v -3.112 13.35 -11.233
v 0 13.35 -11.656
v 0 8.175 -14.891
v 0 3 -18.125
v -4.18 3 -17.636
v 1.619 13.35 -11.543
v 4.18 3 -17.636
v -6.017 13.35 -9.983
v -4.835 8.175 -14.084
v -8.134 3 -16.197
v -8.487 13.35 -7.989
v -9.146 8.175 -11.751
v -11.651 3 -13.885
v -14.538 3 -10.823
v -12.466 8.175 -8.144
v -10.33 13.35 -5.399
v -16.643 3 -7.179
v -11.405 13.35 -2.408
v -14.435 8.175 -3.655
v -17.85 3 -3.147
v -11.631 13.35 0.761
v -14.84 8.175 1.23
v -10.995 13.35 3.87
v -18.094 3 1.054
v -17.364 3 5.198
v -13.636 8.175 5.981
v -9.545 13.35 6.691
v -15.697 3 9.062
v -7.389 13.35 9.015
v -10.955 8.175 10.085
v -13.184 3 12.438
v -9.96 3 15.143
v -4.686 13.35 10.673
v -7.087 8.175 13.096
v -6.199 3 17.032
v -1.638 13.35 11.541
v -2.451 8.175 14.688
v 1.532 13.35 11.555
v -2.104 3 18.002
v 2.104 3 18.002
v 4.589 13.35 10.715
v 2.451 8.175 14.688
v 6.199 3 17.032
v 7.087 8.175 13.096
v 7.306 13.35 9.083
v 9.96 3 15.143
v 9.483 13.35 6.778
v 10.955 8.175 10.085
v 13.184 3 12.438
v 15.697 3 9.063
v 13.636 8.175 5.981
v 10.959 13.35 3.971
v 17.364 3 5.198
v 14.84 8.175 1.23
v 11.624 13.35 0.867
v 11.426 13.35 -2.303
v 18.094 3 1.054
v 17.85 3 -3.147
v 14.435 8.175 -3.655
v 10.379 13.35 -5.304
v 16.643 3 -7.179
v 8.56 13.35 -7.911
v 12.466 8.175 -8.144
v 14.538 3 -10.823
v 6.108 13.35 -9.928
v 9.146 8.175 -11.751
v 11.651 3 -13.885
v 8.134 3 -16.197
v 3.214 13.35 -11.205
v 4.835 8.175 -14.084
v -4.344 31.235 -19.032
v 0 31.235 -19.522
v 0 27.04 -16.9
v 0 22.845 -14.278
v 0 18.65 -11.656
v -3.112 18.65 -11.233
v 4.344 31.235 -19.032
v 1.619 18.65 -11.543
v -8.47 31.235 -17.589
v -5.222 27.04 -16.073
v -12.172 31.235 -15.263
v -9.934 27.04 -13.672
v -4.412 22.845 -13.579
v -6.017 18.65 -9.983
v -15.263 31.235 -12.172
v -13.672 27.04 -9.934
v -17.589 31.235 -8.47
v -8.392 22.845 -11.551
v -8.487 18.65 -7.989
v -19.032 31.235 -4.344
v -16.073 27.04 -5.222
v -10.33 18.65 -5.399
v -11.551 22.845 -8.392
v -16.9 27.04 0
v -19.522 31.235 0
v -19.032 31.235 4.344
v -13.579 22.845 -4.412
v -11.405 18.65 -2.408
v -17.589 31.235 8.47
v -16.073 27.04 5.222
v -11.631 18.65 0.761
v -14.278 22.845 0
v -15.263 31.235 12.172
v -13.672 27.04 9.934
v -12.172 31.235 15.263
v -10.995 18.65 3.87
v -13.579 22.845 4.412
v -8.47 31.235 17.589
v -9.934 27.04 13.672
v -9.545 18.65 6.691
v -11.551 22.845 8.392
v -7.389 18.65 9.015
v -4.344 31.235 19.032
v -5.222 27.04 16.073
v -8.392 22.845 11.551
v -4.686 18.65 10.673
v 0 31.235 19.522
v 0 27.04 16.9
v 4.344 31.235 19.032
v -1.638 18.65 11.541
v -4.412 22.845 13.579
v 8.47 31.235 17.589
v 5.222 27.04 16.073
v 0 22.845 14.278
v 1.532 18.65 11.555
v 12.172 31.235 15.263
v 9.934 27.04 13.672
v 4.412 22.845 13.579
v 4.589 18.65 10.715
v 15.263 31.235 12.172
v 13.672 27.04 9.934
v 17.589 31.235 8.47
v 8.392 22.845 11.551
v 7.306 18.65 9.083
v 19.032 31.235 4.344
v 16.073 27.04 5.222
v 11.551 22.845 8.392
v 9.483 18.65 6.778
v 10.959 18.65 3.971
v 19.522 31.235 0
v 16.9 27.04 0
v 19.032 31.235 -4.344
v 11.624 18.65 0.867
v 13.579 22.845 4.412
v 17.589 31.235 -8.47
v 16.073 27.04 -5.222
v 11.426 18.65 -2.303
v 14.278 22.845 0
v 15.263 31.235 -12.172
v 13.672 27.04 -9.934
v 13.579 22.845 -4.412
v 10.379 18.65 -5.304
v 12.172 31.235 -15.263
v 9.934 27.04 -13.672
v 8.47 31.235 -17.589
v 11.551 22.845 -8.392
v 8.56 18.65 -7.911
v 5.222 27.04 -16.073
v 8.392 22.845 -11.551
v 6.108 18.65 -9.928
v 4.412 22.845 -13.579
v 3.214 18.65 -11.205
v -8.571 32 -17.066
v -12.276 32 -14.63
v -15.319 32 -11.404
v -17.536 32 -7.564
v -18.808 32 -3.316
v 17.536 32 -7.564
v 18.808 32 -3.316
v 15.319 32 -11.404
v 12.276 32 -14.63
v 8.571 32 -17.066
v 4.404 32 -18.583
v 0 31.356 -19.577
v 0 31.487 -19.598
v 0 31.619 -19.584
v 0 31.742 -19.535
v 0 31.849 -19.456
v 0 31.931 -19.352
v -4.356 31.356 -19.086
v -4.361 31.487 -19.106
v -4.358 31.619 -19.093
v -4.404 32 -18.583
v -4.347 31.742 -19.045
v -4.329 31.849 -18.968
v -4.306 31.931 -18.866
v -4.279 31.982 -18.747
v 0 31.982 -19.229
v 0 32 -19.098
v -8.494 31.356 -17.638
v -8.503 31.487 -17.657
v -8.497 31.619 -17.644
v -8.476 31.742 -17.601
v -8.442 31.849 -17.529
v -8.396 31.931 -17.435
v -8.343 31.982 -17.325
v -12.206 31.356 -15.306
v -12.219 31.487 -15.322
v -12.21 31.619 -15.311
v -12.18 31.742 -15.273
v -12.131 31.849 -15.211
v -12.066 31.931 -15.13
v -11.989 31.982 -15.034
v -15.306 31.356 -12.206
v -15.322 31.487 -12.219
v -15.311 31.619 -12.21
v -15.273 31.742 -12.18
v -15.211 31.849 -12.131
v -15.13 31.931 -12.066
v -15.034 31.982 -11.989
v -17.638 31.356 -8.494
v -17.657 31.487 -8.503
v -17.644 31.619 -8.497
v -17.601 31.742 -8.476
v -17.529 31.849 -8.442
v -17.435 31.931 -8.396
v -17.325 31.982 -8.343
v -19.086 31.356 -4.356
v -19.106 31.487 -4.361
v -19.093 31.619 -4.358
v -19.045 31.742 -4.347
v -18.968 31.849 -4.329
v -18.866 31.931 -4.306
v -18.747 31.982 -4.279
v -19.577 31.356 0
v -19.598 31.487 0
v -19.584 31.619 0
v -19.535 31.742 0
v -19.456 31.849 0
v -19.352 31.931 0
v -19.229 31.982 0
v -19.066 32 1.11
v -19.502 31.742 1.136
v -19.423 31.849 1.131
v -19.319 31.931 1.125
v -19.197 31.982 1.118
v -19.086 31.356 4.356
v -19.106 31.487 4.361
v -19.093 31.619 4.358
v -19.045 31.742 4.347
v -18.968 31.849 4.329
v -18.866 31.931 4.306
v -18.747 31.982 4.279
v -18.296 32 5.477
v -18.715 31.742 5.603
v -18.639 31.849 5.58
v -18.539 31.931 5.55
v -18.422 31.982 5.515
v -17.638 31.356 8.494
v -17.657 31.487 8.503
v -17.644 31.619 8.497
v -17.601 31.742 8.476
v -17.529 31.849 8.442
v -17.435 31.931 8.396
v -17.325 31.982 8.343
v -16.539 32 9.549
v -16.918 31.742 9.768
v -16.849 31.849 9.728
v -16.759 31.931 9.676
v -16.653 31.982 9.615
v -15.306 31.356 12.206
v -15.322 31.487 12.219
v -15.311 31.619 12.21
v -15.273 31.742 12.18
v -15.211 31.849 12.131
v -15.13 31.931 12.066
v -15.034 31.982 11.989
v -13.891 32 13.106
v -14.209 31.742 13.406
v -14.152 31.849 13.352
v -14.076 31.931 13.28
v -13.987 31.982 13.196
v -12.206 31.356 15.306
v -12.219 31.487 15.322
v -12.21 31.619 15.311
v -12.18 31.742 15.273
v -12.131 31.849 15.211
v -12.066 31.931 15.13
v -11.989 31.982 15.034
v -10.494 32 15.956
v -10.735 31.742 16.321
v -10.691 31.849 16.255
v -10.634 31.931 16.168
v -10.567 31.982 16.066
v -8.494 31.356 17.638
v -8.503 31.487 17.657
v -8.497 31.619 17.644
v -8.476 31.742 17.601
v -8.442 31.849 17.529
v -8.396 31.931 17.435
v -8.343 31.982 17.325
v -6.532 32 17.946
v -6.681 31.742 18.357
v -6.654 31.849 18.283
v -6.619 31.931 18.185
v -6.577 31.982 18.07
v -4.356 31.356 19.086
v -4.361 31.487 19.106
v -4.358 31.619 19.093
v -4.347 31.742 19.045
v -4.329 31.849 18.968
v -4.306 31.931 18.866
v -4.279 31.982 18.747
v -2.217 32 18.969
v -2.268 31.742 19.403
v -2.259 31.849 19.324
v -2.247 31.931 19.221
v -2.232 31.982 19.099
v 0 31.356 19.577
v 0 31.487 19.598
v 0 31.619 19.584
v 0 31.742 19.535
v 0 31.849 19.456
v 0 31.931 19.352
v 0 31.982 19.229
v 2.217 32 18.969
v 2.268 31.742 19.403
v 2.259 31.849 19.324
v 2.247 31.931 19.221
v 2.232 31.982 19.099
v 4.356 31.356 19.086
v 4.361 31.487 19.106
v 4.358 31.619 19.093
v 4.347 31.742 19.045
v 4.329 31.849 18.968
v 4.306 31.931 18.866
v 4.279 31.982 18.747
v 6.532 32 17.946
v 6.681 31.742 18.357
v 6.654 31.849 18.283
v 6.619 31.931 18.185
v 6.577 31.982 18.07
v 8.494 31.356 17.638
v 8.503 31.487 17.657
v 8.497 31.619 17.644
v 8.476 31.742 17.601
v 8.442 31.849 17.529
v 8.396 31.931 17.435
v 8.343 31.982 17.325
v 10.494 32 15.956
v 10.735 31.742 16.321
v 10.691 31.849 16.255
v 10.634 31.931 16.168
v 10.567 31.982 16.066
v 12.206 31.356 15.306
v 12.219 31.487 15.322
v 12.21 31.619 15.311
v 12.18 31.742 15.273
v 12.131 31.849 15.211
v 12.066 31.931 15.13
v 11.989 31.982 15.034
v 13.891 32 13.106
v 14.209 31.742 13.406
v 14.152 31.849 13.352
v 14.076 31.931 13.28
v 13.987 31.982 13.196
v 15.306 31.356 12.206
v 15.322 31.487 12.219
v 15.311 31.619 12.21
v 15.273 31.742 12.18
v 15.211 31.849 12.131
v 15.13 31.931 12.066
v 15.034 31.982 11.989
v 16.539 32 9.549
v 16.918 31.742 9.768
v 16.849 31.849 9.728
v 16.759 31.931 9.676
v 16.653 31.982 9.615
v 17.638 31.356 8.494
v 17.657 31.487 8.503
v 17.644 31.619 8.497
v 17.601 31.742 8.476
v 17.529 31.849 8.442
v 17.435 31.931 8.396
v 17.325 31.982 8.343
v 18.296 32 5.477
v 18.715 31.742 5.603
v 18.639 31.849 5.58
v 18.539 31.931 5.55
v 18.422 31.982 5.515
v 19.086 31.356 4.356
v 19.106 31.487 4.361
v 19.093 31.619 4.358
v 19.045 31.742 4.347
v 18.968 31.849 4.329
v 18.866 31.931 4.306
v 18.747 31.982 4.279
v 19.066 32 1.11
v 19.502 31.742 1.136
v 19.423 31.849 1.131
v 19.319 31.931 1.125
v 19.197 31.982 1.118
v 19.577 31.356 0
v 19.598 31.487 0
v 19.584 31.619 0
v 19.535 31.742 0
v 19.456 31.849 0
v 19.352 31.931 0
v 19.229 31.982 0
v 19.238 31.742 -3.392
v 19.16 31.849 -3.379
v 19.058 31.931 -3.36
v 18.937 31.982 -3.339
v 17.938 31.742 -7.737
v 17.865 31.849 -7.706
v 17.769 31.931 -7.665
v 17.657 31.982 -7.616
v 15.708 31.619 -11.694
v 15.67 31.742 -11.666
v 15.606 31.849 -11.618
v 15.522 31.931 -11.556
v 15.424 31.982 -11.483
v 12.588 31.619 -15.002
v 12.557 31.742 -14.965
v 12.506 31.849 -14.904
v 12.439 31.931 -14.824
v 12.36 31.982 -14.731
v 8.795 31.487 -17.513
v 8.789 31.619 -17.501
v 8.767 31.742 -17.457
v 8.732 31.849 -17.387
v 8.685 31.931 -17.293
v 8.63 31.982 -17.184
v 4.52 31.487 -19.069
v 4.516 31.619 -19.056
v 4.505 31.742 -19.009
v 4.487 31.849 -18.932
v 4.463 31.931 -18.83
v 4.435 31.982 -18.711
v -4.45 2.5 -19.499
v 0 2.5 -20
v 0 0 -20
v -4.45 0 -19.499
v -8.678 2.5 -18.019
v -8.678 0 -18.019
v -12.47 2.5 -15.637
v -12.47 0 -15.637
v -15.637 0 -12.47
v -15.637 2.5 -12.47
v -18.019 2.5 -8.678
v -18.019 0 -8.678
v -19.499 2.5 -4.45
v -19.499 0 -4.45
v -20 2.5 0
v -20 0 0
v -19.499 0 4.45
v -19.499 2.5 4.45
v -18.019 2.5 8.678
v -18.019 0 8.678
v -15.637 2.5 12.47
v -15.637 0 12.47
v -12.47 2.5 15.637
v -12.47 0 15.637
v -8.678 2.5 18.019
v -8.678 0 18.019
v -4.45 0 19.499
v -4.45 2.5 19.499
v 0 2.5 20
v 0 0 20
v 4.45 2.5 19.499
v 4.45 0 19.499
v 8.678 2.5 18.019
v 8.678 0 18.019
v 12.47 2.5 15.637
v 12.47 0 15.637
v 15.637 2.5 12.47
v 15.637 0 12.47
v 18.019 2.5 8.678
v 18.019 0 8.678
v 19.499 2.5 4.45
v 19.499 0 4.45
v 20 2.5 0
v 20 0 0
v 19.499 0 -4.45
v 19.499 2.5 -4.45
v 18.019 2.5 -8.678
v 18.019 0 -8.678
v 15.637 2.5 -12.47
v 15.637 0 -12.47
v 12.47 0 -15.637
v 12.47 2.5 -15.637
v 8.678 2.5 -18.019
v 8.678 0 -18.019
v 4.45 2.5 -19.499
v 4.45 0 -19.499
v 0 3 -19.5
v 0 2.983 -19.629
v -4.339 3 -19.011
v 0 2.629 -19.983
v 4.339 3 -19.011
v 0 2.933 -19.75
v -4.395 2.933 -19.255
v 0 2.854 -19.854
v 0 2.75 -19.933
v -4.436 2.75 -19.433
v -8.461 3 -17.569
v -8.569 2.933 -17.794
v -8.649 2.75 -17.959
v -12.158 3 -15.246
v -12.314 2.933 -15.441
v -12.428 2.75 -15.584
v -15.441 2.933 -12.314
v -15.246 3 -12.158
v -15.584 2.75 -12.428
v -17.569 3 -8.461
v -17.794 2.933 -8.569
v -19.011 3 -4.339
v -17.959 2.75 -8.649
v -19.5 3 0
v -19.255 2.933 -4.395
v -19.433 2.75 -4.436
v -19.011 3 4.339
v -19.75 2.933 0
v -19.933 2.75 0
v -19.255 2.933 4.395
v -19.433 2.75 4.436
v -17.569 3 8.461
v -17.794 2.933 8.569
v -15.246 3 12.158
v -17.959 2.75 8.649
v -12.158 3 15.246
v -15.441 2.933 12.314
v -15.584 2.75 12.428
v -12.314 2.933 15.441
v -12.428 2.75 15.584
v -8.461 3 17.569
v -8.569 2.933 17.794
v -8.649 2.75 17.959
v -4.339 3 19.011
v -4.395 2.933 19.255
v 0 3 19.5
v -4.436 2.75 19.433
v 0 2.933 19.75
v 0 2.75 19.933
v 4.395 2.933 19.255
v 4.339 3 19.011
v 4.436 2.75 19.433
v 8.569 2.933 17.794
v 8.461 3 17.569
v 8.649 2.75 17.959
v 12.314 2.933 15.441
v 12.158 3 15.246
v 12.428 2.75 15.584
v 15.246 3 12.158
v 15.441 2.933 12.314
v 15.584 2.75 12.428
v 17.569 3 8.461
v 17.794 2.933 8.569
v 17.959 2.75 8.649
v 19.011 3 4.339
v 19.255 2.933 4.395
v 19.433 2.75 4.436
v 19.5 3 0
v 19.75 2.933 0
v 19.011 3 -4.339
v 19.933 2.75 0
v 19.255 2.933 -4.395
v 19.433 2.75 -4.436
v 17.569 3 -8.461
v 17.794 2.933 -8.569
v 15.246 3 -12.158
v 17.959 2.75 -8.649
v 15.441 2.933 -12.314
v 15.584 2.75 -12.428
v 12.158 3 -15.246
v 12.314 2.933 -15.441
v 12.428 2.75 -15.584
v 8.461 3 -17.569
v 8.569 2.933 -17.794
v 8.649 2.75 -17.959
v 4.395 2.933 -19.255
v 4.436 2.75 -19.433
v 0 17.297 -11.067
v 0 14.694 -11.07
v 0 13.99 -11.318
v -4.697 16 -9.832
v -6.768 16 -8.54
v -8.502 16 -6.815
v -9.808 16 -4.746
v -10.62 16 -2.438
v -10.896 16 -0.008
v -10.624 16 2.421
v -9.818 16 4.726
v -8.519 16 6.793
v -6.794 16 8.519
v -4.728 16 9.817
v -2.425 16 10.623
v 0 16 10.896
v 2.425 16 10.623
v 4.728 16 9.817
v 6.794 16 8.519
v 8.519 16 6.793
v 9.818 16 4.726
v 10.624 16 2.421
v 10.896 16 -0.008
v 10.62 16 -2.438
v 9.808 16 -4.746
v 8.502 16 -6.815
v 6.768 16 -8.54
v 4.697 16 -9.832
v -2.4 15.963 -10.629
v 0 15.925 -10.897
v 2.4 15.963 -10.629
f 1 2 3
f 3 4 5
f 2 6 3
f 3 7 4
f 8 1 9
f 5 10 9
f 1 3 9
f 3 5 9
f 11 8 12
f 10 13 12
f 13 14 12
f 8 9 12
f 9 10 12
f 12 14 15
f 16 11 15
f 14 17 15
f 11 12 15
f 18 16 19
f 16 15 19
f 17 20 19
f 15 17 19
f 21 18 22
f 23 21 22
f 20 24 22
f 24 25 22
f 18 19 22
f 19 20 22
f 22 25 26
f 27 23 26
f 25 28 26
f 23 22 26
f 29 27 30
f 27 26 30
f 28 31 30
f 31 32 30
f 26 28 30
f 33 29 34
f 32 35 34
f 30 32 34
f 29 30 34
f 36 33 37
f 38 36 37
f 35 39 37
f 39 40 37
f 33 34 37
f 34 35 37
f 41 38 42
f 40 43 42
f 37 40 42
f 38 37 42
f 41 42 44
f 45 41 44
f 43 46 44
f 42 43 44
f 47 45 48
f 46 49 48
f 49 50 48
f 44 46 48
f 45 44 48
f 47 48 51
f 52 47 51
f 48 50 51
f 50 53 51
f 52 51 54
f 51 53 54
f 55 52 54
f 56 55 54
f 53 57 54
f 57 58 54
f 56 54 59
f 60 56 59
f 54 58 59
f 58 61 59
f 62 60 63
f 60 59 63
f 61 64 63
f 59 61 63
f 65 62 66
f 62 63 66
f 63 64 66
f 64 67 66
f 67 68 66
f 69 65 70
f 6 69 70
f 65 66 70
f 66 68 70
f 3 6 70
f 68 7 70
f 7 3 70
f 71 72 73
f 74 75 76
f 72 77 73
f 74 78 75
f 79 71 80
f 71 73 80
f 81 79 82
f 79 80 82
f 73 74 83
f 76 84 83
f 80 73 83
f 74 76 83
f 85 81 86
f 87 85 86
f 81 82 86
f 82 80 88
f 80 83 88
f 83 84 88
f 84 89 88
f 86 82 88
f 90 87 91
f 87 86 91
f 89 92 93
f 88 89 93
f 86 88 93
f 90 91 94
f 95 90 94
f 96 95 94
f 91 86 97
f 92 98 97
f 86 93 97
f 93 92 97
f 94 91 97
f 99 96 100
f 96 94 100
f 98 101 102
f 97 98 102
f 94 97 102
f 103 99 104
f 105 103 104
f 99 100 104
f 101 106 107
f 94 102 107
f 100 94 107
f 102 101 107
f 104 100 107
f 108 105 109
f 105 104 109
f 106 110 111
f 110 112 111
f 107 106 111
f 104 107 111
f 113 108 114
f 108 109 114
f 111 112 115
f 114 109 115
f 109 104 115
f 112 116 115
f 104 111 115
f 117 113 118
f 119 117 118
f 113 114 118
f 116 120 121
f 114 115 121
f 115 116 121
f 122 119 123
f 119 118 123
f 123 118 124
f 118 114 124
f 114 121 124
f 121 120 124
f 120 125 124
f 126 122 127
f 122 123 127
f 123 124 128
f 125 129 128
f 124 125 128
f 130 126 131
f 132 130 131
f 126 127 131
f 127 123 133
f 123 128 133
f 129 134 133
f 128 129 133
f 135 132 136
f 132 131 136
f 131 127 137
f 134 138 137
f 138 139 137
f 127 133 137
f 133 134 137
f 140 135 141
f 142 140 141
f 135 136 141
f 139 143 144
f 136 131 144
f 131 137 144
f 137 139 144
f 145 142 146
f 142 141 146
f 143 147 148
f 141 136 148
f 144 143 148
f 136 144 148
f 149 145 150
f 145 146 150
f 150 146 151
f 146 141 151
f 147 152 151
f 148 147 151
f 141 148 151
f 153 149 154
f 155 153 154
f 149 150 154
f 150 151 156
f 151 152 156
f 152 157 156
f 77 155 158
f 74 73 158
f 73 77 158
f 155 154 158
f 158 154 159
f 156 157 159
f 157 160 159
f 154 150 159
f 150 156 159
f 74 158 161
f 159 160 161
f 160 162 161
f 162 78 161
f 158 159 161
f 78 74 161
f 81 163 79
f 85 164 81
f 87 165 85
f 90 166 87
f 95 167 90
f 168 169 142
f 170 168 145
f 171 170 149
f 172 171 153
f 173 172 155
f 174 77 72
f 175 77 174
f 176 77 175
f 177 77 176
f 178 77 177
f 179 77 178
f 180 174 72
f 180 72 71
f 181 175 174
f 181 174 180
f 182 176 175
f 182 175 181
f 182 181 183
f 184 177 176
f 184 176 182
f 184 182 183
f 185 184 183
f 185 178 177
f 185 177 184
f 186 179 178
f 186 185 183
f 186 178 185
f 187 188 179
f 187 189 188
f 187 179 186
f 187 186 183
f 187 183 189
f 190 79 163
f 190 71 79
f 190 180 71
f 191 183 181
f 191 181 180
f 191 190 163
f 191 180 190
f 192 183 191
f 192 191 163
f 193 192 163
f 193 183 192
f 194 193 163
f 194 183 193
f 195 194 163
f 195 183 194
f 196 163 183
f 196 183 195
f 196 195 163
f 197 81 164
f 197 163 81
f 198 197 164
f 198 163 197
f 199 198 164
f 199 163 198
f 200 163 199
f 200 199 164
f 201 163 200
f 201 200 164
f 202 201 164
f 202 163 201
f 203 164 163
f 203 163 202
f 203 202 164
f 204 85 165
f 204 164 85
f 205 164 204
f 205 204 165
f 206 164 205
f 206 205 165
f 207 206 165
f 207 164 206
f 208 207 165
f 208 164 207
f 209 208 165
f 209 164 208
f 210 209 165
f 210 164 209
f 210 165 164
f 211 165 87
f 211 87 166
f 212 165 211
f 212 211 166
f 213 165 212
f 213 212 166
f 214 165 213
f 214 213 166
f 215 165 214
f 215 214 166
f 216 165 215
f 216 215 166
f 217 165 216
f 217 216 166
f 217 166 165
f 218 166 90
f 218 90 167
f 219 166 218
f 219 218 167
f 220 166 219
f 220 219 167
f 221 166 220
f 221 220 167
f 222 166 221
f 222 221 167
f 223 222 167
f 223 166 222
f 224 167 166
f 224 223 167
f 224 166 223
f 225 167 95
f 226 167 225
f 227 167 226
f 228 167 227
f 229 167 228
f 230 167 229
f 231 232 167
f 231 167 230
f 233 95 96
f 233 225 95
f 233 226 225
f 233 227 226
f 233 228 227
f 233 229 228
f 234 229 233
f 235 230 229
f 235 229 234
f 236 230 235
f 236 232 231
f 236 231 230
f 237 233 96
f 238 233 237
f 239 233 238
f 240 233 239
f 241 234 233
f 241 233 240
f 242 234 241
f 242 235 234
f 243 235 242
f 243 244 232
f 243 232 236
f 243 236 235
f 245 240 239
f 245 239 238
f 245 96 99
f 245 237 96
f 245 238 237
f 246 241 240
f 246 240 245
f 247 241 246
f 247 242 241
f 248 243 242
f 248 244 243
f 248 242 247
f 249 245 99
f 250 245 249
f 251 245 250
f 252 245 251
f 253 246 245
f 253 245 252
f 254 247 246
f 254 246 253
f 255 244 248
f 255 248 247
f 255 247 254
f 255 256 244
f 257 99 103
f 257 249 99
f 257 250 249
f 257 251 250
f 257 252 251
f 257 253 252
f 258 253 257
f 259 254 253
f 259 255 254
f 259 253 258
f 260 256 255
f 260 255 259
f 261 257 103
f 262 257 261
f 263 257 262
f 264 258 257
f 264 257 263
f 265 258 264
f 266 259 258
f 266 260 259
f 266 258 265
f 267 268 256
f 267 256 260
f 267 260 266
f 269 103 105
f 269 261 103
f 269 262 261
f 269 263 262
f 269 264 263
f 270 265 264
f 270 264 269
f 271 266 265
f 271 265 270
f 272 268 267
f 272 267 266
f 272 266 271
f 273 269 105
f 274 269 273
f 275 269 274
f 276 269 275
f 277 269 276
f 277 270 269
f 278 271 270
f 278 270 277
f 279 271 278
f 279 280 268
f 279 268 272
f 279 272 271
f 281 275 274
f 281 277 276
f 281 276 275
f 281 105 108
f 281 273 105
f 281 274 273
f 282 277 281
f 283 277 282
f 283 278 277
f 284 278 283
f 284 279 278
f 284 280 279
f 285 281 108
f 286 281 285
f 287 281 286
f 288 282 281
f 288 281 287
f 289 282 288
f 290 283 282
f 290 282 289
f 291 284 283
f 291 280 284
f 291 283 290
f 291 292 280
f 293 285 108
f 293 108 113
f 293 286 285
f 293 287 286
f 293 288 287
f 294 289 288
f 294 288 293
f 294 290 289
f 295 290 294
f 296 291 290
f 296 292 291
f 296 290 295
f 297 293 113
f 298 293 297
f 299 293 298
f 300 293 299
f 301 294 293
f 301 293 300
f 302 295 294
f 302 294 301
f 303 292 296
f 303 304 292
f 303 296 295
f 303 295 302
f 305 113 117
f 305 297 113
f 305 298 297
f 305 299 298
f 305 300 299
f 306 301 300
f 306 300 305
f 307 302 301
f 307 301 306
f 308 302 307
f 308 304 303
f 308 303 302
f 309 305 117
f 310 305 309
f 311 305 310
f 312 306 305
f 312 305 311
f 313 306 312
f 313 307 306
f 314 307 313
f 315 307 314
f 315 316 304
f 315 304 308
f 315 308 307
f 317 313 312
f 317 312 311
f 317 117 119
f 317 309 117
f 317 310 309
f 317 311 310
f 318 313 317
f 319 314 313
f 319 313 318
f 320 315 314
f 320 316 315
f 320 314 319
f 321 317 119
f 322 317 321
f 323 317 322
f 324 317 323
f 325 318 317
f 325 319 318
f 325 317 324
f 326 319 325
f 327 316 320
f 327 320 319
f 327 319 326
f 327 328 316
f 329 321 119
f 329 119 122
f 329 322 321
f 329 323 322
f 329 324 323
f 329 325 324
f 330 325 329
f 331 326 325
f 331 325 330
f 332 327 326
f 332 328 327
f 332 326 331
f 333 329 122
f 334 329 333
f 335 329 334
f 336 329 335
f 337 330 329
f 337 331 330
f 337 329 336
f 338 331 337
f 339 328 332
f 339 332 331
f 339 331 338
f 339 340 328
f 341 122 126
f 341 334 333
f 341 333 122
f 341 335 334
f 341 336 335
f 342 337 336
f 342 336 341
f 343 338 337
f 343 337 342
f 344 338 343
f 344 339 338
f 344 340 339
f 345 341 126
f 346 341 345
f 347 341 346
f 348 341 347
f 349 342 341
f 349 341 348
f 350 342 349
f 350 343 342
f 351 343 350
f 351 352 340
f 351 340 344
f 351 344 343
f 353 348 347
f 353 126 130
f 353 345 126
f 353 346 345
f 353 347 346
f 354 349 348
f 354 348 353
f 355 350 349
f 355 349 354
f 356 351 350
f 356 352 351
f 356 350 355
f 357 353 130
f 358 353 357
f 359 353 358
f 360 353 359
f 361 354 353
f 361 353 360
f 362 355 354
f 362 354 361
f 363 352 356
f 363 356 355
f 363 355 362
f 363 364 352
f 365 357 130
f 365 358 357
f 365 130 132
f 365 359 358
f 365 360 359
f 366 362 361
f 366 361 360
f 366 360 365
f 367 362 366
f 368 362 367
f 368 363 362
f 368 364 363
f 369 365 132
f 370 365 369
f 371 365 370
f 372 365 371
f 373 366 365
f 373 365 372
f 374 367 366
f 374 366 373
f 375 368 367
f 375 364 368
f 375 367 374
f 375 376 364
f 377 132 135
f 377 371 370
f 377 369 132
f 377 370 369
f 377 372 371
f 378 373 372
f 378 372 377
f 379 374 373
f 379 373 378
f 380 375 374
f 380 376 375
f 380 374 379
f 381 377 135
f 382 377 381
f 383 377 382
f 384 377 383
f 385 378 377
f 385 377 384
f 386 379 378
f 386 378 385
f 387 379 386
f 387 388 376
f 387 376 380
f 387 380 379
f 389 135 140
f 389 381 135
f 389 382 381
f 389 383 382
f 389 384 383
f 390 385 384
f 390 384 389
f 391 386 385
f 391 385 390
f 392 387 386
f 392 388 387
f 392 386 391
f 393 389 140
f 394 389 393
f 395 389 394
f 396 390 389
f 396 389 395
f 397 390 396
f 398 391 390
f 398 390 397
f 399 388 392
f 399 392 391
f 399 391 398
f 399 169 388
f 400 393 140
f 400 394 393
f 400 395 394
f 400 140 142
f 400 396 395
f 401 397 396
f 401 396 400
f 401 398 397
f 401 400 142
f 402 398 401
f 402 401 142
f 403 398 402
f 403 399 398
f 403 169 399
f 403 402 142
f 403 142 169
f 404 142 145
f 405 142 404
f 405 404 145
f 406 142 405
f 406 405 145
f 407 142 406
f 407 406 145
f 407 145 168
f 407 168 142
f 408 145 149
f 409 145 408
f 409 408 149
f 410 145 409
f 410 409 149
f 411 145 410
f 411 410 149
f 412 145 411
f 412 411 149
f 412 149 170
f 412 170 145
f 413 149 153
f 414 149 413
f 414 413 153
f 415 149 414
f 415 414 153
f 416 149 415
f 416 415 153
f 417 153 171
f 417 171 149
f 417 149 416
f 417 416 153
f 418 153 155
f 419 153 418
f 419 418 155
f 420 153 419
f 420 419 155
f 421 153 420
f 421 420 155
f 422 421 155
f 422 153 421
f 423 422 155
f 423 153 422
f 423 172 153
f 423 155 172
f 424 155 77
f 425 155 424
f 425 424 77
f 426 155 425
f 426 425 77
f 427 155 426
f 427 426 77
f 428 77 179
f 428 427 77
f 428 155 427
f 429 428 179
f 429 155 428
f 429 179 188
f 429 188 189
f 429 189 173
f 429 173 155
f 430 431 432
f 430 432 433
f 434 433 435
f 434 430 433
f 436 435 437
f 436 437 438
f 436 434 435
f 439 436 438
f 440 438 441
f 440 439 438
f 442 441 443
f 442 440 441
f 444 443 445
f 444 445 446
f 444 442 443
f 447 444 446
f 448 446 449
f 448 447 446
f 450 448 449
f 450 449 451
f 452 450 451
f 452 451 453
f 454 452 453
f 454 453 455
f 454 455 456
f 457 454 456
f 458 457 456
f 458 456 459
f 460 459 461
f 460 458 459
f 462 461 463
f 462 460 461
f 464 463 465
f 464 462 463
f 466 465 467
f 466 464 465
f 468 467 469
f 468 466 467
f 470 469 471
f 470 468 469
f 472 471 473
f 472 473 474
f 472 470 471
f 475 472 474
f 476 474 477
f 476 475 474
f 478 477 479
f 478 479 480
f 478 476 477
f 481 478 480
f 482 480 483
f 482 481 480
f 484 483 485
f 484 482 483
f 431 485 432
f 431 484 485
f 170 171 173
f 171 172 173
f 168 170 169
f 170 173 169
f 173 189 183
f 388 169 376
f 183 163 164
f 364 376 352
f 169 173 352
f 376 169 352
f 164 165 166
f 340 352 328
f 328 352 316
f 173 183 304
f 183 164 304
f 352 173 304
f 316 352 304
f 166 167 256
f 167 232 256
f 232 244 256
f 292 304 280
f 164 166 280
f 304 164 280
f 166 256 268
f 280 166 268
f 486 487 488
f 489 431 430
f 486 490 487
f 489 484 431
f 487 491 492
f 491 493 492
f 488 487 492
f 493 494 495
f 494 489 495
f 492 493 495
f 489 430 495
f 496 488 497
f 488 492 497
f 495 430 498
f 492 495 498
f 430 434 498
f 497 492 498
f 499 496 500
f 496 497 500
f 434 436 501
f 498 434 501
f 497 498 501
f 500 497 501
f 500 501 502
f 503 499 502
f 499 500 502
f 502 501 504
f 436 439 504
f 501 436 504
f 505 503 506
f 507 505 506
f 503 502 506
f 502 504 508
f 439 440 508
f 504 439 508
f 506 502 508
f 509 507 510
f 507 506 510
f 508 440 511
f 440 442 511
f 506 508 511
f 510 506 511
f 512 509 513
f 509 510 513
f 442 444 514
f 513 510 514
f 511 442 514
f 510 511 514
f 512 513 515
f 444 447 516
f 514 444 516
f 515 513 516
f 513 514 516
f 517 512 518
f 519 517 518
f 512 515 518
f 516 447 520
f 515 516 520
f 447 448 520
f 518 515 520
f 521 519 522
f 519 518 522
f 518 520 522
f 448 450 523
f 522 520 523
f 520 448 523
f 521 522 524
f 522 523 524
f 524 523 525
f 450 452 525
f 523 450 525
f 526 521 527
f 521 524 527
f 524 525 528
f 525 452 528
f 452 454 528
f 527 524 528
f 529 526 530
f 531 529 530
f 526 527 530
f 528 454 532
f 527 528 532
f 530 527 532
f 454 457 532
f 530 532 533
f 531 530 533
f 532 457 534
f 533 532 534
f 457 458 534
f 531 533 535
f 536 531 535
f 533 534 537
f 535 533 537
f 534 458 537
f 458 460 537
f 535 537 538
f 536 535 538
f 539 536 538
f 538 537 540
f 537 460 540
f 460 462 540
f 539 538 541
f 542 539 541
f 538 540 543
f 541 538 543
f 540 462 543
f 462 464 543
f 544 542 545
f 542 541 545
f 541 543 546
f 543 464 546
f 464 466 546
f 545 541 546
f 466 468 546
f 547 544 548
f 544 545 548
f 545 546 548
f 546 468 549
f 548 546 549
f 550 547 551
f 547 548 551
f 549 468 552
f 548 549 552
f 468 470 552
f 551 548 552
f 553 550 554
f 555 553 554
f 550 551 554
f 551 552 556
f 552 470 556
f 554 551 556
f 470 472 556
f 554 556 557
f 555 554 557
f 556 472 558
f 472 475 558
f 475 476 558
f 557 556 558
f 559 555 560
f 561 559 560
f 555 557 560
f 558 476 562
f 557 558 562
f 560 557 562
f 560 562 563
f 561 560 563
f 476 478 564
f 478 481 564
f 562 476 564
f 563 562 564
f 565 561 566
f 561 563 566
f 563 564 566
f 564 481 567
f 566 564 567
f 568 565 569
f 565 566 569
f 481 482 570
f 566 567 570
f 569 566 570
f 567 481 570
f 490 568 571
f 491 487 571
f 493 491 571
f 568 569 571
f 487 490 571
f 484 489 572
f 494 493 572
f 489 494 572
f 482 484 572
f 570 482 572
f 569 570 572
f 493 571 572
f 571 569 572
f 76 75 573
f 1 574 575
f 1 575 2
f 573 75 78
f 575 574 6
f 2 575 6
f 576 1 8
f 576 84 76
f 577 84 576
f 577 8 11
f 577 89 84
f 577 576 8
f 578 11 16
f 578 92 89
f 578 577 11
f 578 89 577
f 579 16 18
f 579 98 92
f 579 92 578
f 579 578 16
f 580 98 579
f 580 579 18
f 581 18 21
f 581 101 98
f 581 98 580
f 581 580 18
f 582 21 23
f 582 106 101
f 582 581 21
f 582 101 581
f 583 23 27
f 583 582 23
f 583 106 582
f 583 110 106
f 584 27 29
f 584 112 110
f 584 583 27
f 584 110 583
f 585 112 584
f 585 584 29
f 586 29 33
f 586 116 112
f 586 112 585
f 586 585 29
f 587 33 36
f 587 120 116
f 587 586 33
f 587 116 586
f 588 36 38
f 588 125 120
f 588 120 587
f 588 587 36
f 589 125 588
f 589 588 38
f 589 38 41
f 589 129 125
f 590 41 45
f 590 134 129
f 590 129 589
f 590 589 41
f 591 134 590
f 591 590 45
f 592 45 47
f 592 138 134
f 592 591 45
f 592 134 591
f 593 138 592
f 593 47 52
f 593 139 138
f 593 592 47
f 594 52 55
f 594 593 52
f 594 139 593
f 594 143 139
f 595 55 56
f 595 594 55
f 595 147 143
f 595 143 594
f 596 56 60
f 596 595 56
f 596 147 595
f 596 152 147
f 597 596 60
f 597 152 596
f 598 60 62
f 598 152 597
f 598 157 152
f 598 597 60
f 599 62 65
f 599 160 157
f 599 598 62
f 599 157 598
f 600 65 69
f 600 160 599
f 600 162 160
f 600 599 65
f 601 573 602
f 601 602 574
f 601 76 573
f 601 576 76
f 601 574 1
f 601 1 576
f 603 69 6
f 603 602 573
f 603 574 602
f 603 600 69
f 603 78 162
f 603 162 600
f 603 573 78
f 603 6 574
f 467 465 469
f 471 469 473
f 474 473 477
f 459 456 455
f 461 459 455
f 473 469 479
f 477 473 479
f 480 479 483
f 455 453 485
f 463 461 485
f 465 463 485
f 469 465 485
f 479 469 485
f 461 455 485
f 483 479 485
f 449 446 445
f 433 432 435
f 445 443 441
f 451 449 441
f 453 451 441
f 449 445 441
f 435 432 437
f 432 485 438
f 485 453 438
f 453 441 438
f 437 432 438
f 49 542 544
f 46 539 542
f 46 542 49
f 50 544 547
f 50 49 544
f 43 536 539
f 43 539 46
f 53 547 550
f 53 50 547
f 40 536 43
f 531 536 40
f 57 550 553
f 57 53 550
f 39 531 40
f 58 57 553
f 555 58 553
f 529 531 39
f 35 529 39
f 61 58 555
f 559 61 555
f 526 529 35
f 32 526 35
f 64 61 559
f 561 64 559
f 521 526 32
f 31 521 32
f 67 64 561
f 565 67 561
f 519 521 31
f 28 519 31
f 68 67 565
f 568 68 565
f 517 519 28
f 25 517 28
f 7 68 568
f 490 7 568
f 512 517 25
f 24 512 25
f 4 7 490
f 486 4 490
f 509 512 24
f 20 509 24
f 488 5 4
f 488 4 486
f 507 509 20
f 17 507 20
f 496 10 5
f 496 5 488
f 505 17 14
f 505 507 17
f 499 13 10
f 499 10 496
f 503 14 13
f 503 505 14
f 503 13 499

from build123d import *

# Parameters (mm, degrees)
FILLET1_R = 5
FILLET2_R = 0.5
FILLET3_R = 0.5


with BuildPart() as part:
    # Sketch1 → Revolve1 (revolve)
    with BuildSketch(Plane(origin=(0, 0, 0), x_dir=(0, 0, -1), z_dir=(1, 0, 0))):
        Polygon((20, 0), (0, 0), (0, 32), (20, 32), (10, 16), align=None)
        Polygon((18.125, 3), (20, 0), (20, 3), align=None)
    revolve(axis=Axis((0, 0, 0), (0, 1, 0)))

    # Fillet1
    fillet1_edges = [part.edges().sort_by_distance(p)[0] for p in [
        (0, 16, 10),
    ]]
    fillet(fillet1_edges, radius=FILLET1_R)

    # Fillet2
    fillet2_edges = [part.edges().sort_by_distance(p)[0] for p in [
        (0, 32, 20),
    ]]
    fillet(fillet2_edges, radius=FILLET2_R)

    # Fillet3
    fillet3_edges = [part.edges().sort_by_distance(p)[0] for p in [
        (0, 3, 20),
    ]]
    fillet(fillet3_edges, radius=FILLET3_R)


solid = part.part
